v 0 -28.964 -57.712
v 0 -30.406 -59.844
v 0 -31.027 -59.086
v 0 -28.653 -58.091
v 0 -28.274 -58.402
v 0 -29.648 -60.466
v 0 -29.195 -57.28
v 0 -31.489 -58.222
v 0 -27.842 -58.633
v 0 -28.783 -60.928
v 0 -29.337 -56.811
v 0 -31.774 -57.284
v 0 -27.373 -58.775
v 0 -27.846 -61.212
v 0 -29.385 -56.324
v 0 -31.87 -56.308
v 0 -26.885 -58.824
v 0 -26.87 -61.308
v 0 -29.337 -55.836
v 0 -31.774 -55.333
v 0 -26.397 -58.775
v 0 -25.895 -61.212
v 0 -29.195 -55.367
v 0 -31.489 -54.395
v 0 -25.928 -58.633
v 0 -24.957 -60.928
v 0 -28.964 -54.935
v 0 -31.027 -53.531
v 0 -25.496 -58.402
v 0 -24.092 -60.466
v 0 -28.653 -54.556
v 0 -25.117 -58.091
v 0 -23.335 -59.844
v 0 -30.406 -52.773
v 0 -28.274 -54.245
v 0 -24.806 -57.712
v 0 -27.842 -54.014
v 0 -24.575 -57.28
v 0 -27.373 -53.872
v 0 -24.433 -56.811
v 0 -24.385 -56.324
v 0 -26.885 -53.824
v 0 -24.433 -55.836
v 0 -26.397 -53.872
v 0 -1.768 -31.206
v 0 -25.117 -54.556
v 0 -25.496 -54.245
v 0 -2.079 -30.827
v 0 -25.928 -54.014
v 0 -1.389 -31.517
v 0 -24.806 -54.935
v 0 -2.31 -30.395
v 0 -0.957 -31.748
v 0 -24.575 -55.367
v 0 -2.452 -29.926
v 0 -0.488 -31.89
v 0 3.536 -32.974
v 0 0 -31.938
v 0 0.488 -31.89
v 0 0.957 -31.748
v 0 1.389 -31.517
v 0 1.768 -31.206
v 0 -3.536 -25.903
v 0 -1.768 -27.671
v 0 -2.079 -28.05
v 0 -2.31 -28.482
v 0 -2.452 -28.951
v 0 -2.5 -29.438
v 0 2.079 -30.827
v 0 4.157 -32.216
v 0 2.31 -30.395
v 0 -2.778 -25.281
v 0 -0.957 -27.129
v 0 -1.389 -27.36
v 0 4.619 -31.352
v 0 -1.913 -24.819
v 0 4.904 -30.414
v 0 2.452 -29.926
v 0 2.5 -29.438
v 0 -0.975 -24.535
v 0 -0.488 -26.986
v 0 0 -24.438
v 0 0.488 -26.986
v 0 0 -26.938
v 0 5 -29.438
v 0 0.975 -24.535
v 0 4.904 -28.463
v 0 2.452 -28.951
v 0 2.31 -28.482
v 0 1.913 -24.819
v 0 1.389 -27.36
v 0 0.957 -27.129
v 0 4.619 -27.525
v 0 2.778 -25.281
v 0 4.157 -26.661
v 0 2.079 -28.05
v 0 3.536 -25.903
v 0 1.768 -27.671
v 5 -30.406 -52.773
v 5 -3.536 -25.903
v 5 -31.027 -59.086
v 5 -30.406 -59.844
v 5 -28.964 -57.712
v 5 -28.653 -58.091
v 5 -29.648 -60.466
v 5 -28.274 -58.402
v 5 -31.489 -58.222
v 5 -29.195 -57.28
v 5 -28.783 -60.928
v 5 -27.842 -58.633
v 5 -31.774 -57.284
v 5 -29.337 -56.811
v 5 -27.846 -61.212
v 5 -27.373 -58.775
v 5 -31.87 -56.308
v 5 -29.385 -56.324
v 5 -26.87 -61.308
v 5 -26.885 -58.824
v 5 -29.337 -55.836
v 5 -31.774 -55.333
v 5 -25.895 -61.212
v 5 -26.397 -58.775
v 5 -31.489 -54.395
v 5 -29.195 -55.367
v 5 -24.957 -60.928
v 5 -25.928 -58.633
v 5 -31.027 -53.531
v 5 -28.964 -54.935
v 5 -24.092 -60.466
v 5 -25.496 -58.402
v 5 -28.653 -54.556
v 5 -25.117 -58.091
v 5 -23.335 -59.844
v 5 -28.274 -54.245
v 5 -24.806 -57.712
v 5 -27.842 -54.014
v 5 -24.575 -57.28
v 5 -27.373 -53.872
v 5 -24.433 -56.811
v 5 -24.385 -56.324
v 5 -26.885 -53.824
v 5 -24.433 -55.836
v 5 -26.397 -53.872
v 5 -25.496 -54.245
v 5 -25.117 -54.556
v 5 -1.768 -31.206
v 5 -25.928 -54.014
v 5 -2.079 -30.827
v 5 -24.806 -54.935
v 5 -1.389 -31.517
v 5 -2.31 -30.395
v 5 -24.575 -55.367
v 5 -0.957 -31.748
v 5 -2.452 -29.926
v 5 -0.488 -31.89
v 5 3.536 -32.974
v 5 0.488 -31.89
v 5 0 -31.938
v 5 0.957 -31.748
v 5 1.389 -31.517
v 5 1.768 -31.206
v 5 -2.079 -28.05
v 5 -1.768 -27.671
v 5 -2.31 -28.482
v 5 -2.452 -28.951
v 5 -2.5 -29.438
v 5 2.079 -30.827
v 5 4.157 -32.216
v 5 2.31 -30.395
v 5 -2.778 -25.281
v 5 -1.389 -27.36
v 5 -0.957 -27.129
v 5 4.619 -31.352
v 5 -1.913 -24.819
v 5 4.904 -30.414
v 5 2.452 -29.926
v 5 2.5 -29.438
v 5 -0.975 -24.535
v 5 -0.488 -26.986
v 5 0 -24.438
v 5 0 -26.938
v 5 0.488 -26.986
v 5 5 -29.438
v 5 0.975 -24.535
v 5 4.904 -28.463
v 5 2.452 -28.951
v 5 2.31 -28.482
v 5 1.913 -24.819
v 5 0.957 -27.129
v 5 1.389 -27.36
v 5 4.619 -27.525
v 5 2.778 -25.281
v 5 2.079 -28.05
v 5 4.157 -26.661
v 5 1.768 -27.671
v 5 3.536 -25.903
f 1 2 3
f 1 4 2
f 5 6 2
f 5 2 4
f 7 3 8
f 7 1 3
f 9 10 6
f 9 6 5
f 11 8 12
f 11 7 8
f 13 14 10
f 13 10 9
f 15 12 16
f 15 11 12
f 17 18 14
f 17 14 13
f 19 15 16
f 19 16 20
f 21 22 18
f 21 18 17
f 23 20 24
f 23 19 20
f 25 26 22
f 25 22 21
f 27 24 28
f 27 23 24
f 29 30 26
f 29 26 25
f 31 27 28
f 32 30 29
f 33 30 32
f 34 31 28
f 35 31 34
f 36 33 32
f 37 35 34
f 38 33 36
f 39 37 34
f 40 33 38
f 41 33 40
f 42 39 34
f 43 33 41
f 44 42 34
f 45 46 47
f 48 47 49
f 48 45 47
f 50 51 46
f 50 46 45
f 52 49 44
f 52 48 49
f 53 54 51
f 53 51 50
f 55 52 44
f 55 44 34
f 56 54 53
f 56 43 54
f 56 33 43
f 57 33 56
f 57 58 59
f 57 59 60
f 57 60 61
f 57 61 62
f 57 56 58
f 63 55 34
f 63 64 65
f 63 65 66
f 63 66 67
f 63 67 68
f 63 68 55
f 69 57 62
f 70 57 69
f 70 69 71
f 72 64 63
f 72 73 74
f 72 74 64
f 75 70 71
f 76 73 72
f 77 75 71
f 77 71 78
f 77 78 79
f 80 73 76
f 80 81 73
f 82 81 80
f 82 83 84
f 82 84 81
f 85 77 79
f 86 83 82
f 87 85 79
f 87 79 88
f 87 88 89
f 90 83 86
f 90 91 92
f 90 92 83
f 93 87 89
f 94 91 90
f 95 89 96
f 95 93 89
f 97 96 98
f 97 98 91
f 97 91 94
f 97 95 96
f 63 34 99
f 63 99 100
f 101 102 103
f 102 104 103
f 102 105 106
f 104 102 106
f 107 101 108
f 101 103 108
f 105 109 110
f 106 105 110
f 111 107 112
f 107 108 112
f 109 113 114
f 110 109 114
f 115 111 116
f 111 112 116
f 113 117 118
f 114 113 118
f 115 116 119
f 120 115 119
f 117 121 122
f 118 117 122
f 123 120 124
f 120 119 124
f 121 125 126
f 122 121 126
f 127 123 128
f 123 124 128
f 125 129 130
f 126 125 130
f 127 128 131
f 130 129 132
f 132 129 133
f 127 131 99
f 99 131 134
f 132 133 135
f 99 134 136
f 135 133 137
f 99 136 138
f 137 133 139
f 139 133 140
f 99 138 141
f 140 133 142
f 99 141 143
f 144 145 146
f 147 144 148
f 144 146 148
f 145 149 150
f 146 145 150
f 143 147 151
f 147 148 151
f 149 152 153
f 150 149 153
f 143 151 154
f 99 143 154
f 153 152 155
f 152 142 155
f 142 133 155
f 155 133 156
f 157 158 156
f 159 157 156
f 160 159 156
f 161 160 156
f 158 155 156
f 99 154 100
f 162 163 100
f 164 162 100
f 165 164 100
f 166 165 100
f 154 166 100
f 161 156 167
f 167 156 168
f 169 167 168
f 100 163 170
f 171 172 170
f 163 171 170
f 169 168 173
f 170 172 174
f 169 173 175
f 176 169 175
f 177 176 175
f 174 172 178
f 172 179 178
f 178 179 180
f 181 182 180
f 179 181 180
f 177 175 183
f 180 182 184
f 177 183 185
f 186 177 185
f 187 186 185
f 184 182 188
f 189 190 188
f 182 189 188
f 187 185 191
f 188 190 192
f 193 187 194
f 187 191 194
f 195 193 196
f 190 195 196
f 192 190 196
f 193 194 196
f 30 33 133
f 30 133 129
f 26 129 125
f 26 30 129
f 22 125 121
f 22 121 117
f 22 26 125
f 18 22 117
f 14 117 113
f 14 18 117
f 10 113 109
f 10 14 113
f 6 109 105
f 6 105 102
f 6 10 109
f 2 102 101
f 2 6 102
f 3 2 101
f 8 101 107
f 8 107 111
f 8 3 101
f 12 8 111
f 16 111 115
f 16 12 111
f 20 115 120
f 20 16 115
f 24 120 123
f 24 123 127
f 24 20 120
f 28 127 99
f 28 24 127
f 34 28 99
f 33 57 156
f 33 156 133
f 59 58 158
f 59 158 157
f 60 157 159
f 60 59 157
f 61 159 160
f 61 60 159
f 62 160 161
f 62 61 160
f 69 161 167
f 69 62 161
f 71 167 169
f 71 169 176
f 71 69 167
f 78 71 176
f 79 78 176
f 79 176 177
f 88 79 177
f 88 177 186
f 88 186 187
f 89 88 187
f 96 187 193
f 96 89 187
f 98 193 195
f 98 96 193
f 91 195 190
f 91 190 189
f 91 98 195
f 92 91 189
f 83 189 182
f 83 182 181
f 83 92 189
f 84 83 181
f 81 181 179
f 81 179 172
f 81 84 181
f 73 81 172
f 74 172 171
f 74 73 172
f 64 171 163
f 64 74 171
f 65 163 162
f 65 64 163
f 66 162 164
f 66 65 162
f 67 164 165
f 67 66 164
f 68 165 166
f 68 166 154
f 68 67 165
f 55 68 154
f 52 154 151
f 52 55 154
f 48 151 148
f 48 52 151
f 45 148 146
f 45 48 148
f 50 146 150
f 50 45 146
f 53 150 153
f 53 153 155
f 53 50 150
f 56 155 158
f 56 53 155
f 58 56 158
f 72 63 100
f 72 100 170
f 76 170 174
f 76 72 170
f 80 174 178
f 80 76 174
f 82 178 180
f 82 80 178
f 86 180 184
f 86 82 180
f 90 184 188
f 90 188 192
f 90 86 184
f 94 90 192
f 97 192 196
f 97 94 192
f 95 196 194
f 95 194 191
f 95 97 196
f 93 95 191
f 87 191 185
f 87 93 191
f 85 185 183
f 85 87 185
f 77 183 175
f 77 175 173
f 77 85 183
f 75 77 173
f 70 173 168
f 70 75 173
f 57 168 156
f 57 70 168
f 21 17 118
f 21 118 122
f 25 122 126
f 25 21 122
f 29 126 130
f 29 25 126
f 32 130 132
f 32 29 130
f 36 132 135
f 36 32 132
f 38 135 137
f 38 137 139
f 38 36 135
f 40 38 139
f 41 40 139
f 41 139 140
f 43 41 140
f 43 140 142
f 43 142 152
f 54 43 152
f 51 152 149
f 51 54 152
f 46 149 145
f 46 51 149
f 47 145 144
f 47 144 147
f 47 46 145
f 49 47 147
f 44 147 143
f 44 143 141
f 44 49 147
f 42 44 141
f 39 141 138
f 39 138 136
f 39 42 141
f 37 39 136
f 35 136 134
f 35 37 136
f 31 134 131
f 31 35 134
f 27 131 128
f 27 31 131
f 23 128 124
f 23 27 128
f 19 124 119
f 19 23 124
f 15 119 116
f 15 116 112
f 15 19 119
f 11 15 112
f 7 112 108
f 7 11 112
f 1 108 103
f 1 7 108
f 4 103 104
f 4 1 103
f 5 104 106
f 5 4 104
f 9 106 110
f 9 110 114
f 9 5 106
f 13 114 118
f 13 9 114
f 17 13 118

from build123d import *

# Parameters (mm, degrees)
SKETCH1_R           = 2.5
BOSS_EXTRUDE1_DEPTH = 5


with BuildPart() as part:
    # Sketch1 → Boss-Extrude1 (new body)
    with BuildSketch(Plane(origin=(0, 0, 0), x_dir=(0, 0, -1), z_dir=(1, 0, 0))):
        with BuildLine():
            Line((32.973972115, 3.535533906), (59.8440298, -23.334523779))
            ThreePointArc((59.8440298, -23.334523779), (59.8440298, -30.405591591), (52.772961988, -30.405591591))
            Line((52.772961988, -30.405591591), (25.902904303, -3.535533906))
            ThreePointArc((25.902904303, -3.535533906), (25.902904303, 3.535533906), (32.973972115, 3.535533906))
        make_face()
        with Locations((29.438438209, 0)):
            Circle(SKETCH1_R, mode=Mode.SUBTRACT)
        with Locations((56.323505195, -26.885066985)):
            Circle(SKETCH1_R, mode=Mode.SUBTRACT)
    extrude(amount=BOSS_EXTRUDE1_DEPTH)


solid = part.part
